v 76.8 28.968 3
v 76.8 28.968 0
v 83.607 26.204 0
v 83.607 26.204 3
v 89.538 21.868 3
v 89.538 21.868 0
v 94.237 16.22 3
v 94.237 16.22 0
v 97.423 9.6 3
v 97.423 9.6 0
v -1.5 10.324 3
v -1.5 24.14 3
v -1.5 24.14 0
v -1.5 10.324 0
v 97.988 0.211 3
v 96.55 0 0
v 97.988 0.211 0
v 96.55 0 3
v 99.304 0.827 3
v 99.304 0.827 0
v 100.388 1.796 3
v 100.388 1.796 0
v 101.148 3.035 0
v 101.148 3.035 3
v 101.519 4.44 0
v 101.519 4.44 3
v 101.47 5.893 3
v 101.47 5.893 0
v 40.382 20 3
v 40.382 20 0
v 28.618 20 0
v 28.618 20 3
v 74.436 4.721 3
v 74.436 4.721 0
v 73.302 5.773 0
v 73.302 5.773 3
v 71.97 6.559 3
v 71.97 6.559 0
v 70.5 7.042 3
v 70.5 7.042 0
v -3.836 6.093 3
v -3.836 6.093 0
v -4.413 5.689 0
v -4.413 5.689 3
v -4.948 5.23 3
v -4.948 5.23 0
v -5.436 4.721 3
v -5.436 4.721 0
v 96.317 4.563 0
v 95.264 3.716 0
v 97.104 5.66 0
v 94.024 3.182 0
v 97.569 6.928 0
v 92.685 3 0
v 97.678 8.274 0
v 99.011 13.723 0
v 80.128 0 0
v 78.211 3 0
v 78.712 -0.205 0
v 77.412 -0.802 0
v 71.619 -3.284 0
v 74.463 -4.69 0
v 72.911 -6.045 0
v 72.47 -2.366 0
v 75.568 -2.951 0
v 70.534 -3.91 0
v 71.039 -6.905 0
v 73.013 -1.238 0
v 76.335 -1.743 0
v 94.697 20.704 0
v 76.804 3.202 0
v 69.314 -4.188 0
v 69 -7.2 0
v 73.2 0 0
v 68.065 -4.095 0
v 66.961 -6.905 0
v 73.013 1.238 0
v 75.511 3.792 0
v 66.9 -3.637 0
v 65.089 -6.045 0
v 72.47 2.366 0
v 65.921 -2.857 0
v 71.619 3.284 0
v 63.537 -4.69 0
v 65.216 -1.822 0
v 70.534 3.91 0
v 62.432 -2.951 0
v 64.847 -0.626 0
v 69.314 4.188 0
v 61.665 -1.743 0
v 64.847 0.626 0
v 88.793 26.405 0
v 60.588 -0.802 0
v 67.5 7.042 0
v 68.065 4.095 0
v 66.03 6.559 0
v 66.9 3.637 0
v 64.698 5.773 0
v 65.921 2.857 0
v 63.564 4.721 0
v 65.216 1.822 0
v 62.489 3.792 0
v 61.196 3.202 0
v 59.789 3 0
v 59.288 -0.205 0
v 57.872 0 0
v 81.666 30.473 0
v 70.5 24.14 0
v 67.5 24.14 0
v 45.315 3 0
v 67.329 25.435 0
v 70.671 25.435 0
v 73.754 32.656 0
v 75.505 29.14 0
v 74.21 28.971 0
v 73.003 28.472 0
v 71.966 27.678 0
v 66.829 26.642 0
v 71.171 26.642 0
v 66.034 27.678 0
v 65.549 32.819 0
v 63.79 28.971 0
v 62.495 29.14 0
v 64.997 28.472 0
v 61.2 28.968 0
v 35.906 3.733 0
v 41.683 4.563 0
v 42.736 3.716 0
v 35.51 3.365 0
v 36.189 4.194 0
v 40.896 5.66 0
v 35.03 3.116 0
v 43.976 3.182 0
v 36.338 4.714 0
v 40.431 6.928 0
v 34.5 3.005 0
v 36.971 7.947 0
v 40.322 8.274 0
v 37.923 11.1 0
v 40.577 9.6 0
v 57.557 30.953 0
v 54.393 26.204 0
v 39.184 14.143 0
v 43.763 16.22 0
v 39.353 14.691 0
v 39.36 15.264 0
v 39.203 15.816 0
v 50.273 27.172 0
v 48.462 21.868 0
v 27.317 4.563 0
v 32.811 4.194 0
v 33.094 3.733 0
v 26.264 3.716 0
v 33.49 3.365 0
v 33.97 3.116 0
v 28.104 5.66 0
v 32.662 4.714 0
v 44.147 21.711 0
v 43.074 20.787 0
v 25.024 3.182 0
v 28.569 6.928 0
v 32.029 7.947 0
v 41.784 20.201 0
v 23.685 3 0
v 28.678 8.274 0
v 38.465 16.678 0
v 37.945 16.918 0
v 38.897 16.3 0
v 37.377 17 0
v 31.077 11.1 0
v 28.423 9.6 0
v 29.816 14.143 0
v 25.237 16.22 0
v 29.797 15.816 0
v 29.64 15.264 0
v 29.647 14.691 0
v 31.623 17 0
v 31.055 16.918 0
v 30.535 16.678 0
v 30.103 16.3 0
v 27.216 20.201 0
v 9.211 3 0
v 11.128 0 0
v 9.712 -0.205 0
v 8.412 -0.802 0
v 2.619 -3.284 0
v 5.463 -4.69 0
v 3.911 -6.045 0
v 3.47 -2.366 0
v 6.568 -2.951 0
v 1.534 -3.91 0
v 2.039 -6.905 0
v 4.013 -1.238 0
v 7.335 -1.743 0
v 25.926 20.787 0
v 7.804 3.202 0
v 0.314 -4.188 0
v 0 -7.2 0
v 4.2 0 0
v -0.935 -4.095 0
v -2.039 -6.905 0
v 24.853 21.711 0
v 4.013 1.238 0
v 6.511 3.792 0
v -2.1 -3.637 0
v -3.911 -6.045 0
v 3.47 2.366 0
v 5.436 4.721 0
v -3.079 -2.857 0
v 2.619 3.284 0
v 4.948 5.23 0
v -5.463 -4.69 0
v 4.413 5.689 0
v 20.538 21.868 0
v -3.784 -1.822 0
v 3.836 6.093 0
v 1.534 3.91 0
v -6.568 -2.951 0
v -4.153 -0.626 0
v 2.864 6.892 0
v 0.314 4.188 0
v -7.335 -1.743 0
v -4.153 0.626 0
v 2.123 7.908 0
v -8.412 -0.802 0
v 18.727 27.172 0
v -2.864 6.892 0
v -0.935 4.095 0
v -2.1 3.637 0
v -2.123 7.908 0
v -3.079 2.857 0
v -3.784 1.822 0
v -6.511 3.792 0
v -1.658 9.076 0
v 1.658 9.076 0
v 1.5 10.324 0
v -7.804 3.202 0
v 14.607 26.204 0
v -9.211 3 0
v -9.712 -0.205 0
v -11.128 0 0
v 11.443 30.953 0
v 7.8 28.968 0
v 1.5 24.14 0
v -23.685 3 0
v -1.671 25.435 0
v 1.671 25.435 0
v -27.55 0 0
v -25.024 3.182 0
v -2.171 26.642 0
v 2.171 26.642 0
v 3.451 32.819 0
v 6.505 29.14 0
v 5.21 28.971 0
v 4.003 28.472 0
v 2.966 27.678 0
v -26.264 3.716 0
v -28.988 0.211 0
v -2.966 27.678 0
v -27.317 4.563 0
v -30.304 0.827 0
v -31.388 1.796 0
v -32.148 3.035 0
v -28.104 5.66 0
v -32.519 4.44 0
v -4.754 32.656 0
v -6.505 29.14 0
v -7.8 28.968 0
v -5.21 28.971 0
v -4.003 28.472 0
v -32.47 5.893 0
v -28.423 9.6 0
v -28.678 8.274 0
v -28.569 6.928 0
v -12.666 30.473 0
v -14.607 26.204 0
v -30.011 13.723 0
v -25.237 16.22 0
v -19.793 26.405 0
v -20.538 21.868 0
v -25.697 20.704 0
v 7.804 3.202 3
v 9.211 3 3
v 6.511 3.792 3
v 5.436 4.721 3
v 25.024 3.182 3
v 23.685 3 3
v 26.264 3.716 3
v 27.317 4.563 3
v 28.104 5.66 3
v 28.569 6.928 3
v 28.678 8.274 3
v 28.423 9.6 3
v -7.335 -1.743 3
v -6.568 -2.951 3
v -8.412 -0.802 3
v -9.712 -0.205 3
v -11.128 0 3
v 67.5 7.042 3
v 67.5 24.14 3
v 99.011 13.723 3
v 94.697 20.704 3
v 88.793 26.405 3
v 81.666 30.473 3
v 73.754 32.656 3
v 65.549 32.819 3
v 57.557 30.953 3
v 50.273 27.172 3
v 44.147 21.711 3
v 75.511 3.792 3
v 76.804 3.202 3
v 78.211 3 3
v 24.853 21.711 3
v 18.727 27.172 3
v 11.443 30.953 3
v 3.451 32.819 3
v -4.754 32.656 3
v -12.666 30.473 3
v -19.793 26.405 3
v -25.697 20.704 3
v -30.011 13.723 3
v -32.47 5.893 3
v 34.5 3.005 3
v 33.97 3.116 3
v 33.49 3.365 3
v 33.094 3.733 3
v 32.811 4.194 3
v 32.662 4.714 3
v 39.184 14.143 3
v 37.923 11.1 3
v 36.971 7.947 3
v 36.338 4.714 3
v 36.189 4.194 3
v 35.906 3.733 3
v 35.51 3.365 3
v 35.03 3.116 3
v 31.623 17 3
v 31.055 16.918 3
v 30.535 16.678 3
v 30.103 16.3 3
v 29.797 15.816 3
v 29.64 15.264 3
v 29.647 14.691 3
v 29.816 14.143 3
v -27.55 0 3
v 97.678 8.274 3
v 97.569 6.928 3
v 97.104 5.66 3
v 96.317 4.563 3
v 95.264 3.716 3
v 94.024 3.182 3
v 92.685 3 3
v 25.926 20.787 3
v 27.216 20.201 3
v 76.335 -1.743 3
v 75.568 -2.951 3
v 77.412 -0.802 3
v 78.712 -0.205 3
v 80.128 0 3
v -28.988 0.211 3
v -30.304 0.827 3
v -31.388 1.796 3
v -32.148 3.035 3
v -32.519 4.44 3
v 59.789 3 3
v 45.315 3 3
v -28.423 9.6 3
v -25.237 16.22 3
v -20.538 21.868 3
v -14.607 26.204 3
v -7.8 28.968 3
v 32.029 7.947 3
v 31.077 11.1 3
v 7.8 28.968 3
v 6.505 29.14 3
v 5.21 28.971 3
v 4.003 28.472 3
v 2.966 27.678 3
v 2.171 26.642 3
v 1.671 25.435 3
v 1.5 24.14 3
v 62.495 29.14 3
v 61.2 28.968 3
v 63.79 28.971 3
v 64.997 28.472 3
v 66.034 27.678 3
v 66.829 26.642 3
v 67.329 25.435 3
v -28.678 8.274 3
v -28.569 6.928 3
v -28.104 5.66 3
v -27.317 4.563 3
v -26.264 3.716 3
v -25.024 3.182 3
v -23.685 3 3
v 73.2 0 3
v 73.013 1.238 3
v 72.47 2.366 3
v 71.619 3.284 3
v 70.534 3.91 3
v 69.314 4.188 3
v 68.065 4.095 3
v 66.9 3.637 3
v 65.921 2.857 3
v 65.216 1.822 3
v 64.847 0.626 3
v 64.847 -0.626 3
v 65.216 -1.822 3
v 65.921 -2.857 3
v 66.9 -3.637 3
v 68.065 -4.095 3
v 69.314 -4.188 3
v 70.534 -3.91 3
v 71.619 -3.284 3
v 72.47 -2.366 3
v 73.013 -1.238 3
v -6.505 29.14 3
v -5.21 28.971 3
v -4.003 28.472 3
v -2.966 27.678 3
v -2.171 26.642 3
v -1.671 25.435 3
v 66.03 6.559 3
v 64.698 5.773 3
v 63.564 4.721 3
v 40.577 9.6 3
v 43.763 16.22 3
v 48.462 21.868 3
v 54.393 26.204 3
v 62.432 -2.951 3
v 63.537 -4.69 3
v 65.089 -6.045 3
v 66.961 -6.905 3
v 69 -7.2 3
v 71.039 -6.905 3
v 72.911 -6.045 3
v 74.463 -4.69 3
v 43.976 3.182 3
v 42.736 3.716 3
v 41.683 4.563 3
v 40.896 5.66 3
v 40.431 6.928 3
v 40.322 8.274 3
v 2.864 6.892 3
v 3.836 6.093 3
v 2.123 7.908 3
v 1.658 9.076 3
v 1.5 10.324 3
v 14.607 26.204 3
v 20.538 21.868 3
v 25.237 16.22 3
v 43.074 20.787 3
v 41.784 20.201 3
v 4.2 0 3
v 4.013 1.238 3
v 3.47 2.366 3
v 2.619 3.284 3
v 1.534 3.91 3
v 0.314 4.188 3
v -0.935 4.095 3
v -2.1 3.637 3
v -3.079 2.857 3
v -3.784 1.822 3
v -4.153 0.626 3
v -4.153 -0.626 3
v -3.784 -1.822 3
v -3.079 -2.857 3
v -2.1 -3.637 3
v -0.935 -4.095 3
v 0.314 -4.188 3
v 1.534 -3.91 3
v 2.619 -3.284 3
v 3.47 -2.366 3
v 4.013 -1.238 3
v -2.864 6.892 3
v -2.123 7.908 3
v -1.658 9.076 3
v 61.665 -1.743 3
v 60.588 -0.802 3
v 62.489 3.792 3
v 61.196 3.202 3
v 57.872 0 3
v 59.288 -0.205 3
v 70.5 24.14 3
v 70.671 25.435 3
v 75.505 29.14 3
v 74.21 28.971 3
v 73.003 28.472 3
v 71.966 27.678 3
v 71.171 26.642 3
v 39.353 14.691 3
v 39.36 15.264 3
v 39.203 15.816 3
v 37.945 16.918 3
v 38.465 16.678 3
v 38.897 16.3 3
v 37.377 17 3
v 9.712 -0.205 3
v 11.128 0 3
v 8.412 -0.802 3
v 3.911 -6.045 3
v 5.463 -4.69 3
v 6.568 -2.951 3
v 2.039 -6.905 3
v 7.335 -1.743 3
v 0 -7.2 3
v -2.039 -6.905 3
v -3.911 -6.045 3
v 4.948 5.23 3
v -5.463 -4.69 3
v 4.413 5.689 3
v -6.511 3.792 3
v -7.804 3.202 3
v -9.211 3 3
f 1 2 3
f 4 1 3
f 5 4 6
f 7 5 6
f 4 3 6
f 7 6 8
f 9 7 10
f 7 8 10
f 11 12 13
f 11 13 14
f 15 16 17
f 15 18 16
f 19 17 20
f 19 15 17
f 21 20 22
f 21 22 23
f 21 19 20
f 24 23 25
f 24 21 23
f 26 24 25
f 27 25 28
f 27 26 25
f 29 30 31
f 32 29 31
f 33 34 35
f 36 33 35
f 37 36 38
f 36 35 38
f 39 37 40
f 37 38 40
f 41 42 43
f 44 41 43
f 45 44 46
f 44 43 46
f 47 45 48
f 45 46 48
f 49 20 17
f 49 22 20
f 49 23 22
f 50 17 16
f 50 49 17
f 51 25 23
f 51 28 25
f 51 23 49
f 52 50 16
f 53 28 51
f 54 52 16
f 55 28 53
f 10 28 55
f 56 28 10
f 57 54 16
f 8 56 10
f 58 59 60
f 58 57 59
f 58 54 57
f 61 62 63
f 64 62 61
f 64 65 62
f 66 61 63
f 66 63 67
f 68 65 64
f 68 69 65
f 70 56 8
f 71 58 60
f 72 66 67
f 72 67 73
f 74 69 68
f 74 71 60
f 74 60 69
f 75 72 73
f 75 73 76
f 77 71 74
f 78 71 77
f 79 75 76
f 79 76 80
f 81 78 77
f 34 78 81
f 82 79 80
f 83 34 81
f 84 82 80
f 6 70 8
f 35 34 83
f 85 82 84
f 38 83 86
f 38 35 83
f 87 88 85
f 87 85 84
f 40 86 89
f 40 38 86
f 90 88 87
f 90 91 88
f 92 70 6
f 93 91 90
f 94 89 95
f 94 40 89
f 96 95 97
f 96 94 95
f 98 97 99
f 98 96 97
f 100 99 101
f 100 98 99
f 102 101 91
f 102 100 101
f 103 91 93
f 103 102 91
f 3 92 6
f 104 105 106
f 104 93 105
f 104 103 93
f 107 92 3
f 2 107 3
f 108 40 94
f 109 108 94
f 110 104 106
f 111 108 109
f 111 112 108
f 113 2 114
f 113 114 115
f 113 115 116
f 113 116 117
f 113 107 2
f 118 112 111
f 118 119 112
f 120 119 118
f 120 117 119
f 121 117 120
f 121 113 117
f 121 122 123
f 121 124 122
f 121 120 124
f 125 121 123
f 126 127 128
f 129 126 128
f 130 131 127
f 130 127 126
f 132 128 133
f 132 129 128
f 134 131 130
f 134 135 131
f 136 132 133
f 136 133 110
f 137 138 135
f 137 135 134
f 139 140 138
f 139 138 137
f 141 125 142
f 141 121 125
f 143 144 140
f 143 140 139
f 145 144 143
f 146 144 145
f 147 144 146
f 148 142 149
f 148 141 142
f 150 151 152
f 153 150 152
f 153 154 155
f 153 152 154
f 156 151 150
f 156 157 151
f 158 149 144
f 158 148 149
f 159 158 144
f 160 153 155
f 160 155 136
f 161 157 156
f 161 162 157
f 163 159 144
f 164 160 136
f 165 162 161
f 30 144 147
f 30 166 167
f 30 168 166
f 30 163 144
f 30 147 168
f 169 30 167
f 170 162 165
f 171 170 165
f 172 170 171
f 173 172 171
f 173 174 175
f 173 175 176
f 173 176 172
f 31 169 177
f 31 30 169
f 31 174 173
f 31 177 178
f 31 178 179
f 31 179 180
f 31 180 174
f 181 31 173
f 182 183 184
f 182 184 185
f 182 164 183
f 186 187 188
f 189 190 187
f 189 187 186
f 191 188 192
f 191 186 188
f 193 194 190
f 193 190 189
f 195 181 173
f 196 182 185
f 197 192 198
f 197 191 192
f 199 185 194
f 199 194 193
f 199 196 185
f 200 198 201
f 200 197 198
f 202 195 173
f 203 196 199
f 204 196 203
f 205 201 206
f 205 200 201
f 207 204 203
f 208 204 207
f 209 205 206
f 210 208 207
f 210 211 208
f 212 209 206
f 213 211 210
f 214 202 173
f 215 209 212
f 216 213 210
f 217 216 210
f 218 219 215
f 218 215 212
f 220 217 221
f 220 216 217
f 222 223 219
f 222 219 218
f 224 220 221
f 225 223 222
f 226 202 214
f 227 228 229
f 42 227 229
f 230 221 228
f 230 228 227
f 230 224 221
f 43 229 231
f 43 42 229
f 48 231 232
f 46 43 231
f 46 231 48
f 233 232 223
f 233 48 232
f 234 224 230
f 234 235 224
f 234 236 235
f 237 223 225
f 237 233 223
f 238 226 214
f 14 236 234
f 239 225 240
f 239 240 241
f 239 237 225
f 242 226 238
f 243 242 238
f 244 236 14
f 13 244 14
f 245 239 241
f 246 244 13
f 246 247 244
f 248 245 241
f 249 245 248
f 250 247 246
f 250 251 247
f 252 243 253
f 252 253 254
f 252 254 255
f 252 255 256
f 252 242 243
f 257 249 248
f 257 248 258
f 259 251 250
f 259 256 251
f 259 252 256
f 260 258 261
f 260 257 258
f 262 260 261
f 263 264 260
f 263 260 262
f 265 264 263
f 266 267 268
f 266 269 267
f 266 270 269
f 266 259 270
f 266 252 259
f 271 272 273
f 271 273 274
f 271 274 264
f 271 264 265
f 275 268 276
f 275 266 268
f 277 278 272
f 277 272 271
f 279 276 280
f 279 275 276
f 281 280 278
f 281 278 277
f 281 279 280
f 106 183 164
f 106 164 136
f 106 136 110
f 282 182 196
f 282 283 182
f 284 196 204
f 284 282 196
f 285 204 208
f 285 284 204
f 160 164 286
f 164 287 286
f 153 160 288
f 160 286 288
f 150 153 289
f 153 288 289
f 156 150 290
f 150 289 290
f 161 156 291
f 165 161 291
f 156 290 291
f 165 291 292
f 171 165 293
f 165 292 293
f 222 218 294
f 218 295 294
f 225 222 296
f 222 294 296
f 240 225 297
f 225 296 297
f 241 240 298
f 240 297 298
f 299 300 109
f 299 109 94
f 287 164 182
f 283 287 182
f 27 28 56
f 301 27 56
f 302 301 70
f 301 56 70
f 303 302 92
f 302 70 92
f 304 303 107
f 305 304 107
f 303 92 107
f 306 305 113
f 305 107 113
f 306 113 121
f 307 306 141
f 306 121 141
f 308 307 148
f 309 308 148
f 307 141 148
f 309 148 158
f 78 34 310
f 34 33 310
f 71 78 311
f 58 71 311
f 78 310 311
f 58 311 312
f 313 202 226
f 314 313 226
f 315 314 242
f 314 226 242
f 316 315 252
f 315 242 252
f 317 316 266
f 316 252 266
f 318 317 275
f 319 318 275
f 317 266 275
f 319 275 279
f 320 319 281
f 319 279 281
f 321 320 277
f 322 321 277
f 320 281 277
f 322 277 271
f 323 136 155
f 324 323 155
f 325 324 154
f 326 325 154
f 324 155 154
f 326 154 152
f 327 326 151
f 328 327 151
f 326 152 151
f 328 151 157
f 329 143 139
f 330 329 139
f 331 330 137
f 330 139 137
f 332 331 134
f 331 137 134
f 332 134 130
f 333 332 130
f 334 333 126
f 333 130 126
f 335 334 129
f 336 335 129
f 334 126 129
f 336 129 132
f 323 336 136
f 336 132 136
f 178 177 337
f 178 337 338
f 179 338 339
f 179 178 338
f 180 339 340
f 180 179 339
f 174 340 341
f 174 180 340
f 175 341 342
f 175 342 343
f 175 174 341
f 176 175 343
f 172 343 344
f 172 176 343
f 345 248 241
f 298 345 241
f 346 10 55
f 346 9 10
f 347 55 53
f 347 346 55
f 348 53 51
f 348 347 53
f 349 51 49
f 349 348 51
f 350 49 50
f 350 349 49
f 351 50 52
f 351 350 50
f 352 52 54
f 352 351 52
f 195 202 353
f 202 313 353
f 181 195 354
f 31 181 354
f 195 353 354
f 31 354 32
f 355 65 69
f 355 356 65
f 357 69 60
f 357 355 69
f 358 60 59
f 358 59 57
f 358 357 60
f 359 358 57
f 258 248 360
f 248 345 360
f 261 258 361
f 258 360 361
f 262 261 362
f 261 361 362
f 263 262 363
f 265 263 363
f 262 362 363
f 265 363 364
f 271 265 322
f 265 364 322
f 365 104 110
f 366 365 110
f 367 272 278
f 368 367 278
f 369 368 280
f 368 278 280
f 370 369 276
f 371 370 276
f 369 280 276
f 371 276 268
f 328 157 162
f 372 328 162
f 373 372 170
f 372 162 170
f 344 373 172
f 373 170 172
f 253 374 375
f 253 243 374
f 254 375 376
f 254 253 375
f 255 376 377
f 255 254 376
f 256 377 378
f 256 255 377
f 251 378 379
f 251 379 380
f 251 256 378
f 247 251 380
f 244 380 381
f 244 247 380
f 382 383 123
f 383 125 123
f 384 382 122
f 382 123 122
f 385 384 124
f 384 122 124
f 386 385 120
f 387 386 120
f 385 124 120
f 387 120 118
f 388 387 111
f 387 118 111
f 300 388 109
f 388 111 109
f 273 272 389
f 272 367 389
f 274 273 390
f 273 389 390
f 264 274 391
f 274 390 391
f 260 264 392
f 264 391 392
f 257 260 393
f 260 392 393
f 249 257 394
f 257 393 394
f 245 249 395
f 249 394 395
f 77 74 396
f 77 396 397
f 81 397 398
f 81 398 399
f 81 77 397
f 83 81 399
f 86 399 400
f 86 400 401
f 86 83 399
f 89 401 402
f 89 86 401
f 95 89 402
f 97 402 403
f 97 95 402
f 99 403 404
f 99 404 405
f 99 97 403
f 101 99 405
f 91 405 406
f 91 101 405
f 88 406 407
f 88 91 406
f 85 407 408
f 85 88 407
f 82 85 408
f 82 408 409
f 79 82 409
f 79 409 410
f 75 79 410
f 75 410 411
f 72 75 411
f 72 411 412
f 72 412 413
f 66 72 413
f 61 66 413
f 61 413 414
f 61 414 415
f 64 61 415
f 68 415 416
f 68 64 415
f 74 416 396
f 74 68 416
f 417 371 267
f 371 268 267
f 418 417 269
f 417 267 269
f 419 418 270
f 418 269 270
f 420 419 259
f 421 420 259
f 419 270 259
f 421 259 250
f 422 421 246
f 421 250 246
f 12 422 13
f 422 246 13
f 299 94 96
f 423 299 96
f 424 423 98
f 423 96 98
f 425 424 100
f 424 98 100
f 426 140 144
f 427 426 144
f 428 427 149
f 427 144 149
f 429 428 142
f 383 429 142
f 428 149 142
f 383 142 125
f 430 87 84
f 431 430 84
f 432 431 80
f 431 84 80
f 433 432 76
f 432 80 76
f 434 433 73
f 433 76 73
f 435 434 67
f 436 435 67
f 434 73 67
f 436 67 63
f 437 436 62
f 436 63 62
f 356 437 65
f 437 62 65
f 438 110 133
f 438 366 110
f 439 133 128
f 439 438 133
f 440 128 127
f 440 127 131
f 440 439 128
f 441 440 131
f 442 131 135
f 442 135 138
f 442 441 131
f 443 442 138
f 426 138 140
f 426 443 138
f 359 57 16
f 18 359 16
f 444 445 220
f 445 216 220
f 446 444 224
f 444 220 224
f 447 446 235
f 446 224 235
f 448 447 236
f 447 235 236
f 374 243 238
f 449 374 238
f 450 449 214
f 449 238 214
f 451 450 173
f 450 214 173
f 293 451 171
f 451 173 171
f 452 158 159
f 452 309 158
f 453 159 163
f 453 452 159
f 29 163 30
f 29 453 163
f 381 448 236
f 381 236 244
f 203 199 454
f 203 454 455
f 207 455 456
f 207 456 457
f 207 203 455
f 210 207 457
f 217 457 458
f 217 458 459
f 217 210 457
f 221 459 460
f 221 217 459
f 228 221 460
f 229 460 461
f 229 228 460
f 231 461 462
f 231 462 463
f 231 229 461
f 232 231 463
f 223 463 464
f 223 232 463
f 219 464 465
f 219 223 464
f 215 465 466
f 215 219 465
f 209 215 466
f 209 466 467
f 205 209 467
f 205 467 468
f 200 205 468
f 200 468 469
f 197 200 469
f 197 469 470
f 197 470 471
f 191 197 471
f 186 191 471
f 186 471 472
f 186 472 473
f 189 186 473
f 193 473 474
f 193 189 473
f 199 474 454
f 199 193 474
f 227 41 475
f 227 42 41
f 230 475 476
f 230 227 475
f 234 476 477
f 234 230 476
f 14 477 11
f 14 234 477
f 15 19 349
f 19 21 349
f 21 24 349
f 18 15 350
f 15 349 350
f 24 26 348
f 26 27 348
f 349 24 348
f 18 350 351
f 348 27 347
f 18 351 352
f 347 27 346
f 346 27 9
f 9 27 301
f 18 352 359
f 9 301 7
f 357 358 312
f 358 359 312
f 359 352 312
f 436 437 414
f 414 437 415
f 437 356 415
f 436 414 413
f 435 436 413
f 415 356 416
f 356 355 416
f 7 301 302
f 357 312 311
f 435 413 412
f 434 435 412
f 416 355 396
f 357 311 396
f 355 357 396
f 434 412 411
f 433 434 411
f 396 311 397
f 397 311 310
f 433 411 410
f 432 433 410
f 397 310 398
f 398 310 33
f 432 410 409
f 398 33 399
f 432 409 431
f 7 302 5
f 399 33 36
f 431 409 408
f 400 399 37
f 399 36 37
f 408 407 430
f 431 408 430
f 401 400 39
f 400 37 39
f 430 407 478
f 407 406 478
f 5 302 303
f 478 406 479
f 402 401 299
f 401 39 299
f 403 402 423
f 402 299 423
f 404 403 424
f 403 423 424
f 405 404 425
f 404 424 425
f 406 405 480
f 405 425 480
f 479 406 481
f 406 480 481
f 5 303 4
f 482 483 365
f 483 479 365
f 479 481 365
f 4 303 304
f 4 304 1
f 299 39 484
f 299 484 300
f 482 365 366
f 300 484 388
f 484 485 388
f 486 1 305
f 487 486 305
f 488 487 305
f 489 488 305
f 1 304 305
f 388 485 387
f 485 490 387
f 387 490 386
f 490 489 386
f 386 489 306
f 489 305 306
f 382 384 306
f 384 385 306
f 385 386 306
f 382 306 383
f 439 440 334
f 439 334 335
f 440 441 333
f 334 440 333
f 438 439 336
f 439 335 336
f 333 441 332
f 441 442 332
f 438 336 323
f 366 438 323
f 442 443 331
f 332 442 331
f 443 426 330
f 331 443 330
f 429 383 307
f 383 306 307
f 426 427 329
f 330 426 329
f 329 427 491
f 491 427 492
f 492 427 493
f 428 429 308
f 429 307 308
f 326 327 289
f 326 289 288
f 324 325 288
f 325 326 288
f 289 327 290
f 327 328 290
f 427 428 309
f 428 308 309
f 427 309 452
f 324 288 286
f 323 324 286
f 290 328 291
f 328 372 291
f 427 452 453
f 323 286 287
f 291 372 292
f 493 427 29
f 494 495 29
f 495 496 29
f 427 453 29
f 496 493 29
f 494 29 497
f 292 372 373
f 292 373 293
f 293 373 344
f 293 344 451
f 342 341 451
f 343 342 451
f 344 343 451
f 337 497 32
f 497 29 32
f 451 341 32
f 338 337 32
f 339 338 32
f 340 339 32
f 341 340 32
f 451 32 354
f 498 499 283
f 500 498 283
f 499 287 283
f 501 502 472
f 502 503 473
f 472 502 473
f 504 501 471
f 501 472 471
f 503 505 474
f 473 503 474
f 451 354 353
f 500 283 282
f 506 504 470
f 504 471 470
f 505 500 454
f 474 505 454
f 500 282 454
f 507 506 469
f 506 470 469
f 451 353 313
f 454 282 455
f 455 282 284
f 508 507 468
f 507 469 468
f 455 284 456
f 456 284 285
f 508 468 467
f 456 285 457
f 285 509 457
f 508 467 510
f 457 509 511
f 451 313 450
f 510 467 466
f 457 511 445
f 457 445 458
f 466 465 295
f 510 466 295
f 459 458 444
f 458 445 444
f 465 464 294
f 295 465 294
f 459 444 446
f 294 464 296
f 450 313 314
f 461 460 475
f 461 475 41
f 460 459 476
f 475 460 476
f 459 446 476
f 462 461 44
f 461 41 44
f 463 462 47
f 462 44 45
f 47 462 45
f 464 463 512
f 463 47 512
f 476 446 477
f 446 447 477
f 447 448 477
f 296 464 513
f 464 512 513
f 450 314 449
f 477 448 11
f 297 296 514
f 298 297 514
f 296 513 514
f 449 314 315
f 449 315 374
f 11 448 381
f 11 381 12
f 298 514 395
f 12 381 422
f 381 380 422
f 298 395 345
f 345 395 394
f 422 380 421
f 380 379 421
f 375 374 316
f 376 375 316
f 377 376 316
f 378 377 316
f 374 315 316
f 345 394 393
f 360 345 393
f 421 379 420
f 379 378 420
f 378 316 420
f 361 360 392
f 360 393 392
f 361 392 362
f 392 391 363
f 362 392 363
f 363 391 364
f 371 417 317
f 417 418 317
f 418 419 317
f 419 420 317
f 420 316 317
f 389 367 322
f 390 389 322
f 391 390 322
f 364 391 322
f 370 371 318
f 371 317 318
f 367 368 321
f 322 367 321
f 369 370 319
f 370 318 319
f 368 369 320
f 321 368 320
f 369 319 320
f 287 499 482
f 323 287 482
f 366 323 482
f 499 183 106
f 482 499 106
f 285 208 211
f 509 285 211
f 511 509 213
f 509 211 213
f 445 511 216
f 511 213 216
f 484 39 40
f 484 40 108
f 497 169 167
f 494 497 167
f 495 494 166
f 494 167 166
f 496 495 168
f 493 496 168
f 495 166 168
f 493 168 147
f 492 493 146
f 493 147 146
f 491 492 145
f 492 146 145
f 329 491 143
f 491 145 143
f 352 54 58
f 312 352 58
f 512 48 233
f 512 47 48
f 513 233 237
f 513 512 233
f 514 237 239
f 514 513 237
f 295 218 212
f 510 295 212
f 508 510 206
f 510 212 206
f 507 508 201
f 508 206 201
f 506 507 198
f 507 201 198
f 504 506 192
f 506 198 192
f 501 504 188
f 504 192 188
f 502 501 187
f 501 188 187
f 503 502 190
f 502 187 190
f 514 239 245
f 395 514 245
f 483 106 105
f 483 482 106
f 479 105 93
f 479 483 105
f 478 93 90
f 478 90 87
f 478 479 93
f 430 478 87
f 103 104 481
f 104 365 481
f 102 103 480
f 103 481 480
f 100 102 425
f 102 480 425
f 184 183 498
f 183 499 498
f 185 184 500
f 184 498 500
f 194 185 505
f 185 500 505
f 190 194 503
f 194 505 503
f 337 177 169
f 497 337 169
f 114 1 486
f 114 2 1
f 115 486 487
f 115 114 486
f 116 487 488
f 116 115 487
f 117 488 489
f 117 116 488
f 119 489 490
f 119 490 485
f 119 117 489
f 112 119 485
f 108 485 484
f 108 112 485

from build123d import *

# Parameters (mm, degrees)
F0_R        = 4.2
F1_DEPTH    = 3
F3_DEPTH    = 3
F4_R        = 5
F5_T1_DEPTH = 3


# Not quite as in the source:
# - a fillet or chamfer that OpenCascade refuses, or shapes differently, is made with other operations: its cross-section is extruded or revolved along the edge and cut away or added


with BuildPart() as f1:
    # F0 (on Top) → F1 (new body)
    with BuildSketch(Plane.XY):
        with BuildLine():
            ThreePointArc((6.5452272688, 3), (7.0344024741, 1.5353116402), (7.2, 0))
            Line((7.2, 0), (33, 0))
            Line((33, 0), (36, 0))
            Line((36, 0), (61.8, 0))
            ThreePointArc((61.8, 0), (61.9655975259, 1.5353116402), (62.4547727312, 3))
            Line((62.4547727312, 3), (39.1503768868, 3))
            ThreePointArc((39.1503768868, 3), (69, 30), (98.8496231132, 3))
            Line((98.8496231132, 3), (75.5452272688, 3))
            ThreePointArc((75.5452272688, 3), (76.0344024741, 1.5353116402), (76.2, 0))
            Line((76.2, 0), (102, 0))
            ThreePointArc((102, 0), (79.5543660777, 31.2666812549), (42.7511905032, 20))
            Line((42.7511905032, 20), (26.2488094968, 20))
            ThreePointArc((26.2488094968, 20), (-10.5543660777, 31.2666812549), (-33, 0))
            Line((-33, 0), (-7.2, 0))
            ThreePointArc((-7.2, 0), (-7.0344024741, 1.5353116402), (-6.5452272688, 3))
            Line((-6.5452272688, 3), (-29.8496231132, 3))
            ThreePointArc((-29.8496231132, 3), (0, 30), (29.8496231132, 3))
            Line((29.8496231132, 3), (6.5452272688, 3))
        make_face()
        with BuildLine():
            Line((36.1366465497, 3), (32.8633534503, 3))
            ThreePointArc((32.8633534503, 3), (31.364916731, 10.2587522855), (28.2842712475, 17))
            Line((28.2842712475, 17), (40.7157287525, 17))
            ThreePointArc((40.7157287525, 17), (37.635083269, 10.2587522855), (36.1366465497, 3))
        make_face(mode=Mode.SUBTRACT)
        with BuildLine():
            ThreePointArc((-7.2, 0), (0, -7.2), (7.2, 0))
            ThreePointArc((7.2, 0), (7.0344024741, 1.5353116402), (6.5452272688, 3))
            ThreePointArc((6.5452272688, 3), (0, 7.2), (-6.5452272688, 3))
            ThreePointArc((-6.5452272688, 3), (-7.0344024741, 1.5353116402), (-7.2, 0))
        make_face()
        Circle(F0_R, mode=Mode.SUBTRACT)
        with BuildLine():
            ThreePointArc((62.4547727312, 3), (61.9655975259, 1.5353116402), (61.8, 0))
            ThreePointArc((61.8, 0), (69, -7.2), (76.2, 0))
            ThreePointArc((76.2, 0), (76.0344024741, 1.5353116402), (75.5452272688, 3))
            ThreePointArc((75.5452272688, 3), (69, 7.2), (62.4547727312, 3))
        make_face()
        with Locations((69, 0)):
            Circle(F0_R, mode=Mode.SUBTRACT)
    extrude(amount=F1_DEPTH)

    # F2 (on face) → F3 (join, through all)
    with BuildSketch(Plane.XY.offset(3)):
        with BuildLine():
            Line((1.5, 7.0420167566), (1.5, 29.9624765332))
            ThreePointArc((1.5, 29.9624765332), (0.7502346317, 29.9906176662), (0, 30))
            Line((0, 30), (0, 7.2))
            ThreePointArc((0, 7.2), (0.7541483119, 7.1603952631), (1.5, 7.0420167566))
        make_face()
        with BuildLine():
            Line((0, 7.2), (0, 30))
            ThreePointArc((0, 30), (-0.7502346317, 29.9906176662), (-1.5, 29.9624765332))
            Line((-1.5, 29.9624765332), (-1.5, 7.0420167566))
            ThreePointArc((-1.5, 7.0420167566), (-0.7541483119, 7.1603952631), (0, 7.2))
        make_face()
        with BuildLine():
            Line((69, 7.2), (69, 30))
            ThreePointArc((69, 30), (68.2497653683, 29.9906176662), (67.5, 29.9624765332))
            Line((67.5, 29.9624765332), (67.5, 7.0420167566))
            ThreePointArc((67.5, 7.0420167566), (68.2458516881, 7.1603952631), (69, 7.2))
        make_face()
        with BuildLine():
            Line((70.5, 7.0420167566), (70.5, 29.9624765332))
            ThreePointArc((70.5, 29.9624765332), (69.7502346317, 29.9906176662), (69, 30))
            Line((69, 30), (69, 7.2))
            ThreePointArc((69, 7.2), (69.7541483119, 7.1603952631), (70.5, 7.0420167566))
        make_face()
    extrude(amount=-F3_DEPTH)

    # F4
    f4_edges = [f1.edges().sort_by_distance(p)[0] for p in [
        (-29.849623, 3, 1.5),
        (29.849623, 3, 1.5),
        (98.849623, 3, 1.5),
        (39.150377, 3, 1.5),
        (-7.2, 0, 1.5),
        (7.2, 0, 1.5),
        (61.8, 0, 1.5),
        (76.2, 0, 1.5),
        (75.545227, 3, 1.5),
        (62.454773, 3, 1.5),
        (-6.545227, 3, 1.5),
        (6.545227, 3, 1.5),
        (26.248809, 20, 1.5),
        (42.751191, 20, 1.5),
        (102, 0, 1.5),
        (-33, 0, 1.5),
        (-1.5, 7.042017, 1.5),
        (1.5, 7.042017, 1.5),
        (1.5, 29.962477, 1.5),
        (-1.5, 29.962477, 1.5),
        (70.5, 29.962477, 1.5),
        (67.5, 29.962477, 1.5),
    ]]
    fillet(f4_edges, radius=F4_R)

    # F5: fillet of radius 2 on 4 edges, made by hand

    # F5_s2 → F5_t1 (join)
    with BuildSketch(Plane.XY):
        with BuildLine():
            ThreePointArc((31.6227766017, 17), (29.9324680922, 16.0690449676), (29.8157607959, 14.1428571429))
            ThreePointArc((29.8157607959, 14.1428571429), (29.0851207181, 15.5902454379), (28.2842712475, 17))
            Line((28.2842712475, 17), (31.6227766017, 17))
        make_face()
        with BuildLine():
            ThreePointArc((37.3772233983, 17), (39.0675319078, 16.0690449676), (39.1842392041, 14.1428571429))
            ThreePointArc((39.1842392041, 14.1428571429), (39.9148792819, 15.5902454379), (40.7157287525, 17))
            Line((40.7157287525, 17), (37.3772233983, 17))
        make_face()
        with BuildLine():
            ThreePointArc((34.6410161514, 3), (33.33170881, 3.488142108), (32.6615295142, 4.7142857143))
            ThreePointArc((32.6615295142, 4.7142857143), (32.7736520051, 3.8584626791), (32.8633534503, 3))
            Line((32.8633534503, 3), (34.6410161514, 3))
        make_face()
        with BuildLine():
            ThreePointArc((36.3384704858, 4.7142857143), (35.66829119, 3.488142108), (34.3589838486, 3))
            Line((34.3589838486, 3), (36.1366465497, 3))
            ThreePointArc((36.1366465497, 3), (36.2263479949, 3.8584626791), (36.3384704858, 4.7142857143))
        make_face()
    extrude(amount=F5_T1_DEPTH)


solid = f1.part
